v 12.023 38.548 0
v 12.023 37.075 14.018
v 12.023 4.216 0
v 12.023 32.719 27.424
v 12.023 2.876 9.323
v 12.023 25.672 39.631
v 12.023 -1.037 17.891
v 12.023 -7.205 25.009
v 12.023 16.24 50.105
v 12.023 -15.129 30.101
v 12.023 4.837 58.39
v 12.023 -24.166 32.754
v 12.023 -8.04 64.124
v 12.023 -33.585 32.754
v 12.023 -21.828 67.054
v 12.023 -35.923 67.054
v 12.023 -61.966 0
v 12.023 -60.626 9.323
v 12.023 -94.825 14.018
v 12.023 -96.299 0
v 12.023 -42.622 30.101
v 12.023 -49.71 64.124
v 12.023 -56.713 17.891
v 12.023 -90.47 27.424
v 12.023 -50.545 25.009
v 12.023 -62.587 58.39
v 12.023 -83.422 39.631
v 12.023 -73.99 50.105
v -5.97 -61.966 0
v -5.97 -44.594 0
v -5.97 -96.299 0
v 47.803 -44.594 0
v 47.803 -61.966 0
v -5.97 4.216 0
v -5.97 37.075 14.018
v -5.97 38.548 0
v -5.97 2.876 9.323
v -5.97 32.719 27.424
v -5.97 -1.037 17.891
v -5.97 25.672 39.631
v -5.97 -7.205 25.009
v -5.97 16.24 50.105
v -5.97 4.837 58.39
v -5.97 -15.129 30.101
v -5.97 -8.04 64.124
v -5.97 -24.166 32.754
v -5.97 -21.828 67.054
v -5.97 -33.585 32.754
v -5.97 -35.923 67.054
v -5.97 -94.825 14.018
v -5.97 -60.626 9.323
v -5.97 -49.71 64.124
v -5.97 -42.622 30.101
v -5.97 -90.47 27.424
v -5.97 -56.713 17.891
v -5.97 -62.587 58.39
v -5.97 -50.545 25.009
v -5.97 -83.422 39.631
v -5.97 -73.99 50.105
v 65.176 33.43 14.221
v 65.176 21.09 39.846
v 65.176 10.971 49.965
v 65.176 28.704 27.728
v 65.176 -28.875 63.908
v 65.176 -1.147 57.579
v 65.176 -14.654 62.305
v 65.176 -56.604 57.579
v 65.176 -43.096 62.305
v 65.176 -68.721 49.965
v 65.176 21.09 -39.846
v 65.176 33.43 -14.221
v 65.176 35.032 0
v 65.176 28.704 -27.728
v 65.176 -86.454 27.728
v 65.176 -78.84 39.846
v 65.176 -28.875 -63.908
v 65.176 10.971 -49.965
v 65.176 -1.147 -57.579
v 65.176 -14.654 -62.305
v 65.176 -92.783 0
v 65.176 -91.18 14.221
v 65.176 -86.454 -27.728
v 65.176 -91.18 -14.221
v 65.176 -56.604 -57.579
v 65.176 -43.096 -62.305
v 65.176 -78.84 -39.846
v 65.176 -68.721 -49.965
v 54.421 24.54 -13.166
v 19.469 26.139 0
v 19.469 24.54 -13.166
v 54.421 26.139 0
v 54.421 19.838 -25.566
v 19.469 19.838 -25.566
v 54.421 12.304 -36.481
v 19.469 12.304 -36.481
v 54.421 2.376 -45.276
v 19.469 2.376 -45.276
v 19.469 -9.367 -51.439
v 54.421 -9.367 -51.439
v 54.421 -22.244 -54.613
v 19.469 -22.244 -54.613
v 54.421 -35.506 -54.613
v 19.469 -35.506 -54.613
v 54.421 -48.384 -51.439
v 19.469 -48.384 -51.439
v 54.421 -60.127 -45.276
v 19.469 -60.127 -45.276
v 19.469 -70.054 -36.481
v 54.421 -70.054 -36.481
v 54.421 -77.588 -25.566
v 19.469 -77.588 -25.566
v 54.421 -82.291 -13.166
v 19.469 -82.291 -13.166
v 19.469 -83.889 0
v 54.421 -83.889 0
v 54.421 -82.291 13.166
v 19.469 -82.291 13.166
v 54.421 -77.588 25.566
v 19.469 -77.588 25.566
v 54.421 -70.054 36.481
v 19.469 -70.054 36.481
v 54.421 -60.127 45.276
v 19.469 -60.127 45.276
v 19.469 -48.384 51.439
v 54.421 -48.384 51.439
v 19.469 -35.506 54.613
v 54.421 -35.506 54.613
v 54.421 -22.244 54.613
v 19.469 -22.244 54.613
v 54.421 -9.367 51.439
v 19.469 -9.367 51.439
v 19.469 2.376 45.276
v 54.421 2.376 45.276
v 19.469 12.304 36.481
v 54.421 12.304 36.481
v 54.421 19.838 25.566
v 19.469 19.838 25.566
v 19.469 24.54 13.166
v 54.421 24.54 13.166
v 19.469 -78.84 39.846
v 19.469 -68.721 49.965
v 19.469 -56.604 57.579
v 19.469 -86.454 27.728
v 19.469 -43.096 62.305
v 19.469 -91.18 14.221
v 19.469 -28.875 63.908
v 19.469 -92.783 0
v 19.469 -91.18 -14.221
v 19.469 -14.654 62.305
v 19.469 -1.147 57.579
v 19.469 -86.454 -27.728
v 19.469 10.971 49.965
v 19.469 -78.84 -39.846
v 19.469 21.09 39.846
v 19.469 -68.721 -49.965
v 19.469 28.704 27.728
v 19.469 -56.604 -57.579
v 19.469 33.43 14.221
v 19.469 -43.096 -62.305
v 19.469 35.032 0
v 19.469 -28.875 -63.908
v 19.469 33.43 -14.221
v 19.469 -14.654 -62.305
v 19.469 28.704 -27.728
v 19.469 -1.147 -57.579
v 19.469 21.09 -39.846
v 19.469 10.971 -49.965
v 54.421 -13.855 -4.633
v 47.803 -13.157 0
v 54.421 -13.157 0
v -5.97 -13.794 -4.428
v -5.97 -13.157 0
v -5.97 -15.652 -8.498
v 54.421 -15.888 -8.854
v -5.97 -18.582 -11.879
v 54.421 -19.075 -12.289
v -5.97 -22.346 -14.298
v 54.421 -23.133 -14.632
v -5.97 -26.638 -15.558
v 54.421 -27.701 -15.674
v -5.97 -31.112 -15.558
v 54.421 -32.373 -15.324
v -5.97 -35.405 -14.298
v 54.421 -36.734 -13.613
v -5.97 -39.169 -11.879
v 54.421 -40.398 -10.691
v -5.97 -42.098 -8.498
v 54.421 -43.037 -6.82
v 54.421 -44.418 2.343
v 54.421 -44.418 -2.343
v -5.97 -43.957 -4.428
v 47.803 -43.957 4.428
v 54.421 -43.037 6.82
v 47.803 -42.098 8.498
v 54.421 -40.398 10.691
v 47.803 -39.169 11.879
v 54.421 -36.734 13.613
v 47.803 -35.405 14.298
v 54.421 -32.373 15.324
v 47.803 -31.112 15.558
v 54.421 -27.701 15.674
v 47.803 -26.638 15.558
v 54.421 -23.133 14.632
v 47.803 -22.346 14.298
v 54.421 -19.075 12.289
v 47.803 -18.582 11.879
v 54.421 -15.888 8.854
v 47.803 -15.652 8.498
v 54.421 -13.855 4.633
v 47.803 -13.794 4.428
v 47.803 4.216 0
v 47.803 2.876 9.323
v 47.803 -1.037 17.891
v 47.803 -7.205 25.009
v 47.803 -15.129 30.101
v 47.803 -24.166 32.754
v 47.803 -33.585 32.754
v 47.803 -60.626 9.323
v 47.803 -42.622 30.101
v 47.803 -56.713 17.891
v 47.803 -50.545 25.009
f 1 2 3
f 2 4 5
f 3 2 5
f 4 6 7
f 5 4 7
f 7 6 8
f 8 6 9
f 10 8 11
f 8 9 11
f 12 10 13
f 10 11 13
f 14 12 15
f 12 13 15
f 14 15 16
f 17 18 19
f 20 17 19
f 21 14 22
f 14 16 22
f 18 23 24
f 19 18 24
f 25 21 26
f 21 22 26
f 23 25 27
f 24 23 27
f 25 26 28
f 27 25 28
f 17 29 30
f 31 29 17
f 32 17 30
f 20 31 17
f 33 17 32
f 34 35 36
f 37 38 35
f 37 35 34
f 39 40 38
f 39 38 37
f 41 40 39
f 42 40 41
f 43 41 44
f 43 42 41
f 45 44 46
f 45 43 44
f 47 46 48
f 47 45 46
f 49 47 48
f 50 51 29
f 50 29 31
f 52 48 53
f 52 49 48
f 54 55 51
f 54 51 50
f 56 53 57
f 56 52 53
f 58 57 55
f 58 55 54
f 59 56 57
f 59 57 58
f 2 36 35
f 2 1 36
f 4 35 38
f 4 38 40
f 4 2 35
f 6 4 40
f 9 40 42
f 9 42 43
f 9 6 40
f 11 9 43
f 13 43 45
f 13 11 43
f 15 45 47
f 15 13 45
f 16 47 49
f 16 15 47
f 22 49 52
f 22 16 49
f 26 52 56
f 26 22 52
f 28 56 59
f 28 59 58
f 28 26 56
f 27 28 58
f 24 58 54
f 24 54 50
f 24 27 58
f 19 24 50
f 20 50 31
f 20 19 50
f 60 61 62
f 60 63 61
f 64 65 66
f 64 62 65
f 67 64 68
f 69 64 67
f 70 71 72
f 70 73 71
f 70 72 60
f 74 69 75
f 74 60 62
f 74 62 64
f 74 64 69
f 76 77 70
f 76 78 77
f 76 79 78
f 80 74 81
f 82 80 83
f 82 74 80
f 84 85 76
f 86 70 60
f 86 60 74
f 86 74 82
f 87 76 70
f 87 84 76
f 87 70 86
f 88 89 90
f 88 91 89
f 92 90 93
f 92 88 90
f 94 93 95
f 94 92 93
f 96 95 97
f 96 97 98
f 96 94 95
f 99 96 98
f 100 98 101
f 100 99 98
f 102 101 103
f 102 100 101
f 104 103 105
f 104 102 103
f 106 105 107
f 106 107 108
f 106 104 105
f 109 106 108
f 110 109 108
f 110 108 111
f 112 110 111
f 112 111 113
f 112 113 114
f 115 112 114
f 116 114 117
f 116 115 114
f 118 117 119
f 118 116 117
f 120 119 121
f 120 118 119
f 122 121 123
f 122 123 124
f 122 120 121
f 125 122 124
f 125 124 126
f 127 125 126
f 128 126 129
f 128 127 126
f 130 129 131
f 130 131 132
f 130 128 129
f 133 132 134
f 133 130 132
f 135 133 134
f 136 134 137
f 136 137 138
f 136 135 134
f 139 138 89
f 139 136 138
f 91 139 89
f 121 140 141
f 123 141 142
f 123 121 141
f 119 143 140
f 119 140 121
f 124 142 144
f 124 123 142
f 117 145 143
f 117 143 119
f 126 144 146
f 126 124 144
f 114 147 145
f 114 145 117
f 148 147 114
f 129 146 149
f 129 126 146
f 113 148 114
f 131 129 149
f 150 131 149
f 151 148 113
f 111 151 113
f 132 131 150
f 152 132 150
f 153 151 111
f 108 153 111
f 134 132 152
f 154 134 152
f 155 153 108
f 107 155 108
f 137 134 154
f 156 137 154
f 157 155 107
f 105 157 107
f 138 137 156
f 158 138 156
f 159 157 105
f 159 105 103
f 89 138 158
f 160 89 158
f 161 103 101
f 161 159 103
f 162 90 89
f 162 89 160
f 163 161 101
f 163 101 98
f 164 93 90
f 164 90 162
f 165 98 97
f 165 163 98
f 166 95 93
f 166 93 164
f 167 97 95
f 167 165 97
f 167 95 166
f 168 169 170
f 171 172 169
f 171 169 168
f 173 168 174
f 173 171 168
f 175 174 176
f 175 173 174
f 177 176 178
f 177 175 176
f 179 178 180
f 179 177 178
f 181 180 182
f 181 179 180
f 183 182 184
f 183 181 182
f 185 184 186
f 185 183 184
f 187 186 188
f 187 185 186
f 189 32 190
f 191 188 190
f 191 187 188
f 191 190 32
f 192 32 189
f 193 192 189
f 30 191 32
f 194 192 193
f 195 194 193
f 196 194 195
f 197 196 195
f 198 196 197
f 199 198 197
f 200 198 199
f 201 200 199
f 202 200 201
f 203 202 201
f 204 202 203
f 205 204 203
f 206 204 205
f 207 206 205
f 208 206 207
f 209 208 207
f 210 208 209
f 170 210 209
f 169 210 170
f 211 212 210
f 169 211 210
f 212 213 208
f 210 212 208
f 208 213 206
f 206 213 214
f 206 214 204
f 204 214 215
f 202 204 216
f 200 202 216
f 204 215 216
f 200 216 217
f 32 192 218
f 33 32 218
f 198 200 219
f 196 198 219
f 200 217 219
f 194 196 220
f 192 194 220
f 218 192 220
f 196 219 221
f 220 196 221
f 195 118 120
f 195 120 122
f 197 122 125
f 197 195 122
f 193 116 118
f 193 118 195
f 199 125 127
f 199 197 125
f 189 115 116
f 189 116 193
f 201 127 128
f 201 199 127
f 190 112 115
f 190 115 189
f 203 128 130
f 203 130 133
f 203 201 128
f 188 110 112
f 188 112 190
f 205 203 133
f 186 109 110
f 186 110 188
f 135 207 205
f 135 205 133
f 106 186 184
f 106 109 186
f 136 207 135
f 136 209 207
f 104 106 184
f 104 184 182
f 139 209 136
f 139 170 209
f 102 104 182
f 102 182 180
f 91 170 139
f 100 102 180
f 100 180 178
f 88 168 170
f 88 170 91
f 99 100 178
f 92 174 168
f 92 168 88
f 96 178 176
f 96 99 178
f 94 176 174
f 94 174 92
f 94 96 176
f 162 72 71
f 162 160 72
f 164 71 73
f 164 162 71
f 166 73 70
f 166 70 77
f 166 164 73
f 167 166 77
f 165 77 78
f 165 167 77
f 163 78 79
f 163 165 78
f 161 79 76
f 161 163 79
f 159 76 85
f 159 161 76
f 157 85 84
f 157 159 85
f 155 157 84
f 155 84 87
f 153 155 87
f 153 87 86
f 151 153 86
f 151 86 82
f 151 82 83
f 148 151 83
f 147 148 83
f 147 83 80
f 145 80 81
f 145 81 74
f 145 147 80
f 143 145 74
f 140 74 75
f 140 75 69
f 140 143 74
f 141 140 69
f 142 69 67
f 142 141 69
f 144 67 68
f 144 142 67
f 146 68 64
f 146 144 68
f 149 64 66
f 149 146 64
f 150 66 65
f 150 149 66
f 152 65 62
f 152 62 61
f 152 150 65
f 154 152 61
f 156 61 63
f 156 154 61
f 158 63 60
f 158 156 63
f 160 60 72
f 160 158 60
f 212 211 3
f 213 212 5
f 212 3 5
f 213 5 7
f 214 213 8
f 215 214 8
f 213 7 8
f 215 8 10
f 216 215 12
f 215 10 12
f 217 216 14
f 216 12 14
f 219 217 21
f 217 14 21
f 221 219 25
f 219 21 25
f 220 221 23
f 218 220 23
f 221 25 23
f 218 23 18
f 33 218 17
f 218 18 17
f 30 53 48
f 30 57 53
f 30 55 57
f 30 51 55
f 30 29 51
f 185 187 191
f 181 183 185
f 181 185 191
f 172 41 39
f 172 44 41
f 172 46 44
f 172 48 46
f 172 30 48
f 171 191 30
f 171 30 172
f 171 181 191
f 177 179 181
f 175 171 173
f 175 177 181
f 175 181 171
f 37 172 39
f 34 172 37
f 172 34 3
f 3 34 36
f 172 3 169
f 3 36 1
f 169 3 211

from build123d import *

# Parameters (mm, degrees)
F1_W     = 17.993393
F1_H     = 34.332218
F2_ANGLE = -180


with BuildPart() as f2:
    # F1 (on face) → F2 (revolve)
    with BuildSketch(Plane.XY):
        Polygon((12.023137, 4.216103), (-5.970256, 4.216103), (-5.970256, -13.156827), (47.803093, -13.156827), (47.803093, 4.216103), align=None)
        with Locations((3.026441, 21.382212)):
            Rectangle(F1_W, F1_H)
    revolve(axis=Axis((24.225553, -28.875191, 0), (-1, 0, 0)), revolution_arc=F2_ANGLE)

    # F1 (on face) → F3 (revolve)
    with BuildSketch(Plane.XY):
        Polygon((54.421362, 26.139084), (54.421362, -13.156827), (54.421362, -28.875191), (65.176025, -28.875191), (65.176025, 26.139084), align=None)
        Polygon((19.468673, 26.139084), (54.421362, 26.139084), (65.176025, 26.139084), (65.176025, 35.032369), (19.468673, 35.032369), align=None)
        Polygon((47.803093, -13.156827), (-5.970256, -13.156827), (-5.970256, -28.875191), (54.421362, -28.875191), (54.421362, -13.156827), align=None)
    revolve(axis=Axis((59.798693, -28.875191, 0), (-1, 0, 0)))


solid = f2.part
